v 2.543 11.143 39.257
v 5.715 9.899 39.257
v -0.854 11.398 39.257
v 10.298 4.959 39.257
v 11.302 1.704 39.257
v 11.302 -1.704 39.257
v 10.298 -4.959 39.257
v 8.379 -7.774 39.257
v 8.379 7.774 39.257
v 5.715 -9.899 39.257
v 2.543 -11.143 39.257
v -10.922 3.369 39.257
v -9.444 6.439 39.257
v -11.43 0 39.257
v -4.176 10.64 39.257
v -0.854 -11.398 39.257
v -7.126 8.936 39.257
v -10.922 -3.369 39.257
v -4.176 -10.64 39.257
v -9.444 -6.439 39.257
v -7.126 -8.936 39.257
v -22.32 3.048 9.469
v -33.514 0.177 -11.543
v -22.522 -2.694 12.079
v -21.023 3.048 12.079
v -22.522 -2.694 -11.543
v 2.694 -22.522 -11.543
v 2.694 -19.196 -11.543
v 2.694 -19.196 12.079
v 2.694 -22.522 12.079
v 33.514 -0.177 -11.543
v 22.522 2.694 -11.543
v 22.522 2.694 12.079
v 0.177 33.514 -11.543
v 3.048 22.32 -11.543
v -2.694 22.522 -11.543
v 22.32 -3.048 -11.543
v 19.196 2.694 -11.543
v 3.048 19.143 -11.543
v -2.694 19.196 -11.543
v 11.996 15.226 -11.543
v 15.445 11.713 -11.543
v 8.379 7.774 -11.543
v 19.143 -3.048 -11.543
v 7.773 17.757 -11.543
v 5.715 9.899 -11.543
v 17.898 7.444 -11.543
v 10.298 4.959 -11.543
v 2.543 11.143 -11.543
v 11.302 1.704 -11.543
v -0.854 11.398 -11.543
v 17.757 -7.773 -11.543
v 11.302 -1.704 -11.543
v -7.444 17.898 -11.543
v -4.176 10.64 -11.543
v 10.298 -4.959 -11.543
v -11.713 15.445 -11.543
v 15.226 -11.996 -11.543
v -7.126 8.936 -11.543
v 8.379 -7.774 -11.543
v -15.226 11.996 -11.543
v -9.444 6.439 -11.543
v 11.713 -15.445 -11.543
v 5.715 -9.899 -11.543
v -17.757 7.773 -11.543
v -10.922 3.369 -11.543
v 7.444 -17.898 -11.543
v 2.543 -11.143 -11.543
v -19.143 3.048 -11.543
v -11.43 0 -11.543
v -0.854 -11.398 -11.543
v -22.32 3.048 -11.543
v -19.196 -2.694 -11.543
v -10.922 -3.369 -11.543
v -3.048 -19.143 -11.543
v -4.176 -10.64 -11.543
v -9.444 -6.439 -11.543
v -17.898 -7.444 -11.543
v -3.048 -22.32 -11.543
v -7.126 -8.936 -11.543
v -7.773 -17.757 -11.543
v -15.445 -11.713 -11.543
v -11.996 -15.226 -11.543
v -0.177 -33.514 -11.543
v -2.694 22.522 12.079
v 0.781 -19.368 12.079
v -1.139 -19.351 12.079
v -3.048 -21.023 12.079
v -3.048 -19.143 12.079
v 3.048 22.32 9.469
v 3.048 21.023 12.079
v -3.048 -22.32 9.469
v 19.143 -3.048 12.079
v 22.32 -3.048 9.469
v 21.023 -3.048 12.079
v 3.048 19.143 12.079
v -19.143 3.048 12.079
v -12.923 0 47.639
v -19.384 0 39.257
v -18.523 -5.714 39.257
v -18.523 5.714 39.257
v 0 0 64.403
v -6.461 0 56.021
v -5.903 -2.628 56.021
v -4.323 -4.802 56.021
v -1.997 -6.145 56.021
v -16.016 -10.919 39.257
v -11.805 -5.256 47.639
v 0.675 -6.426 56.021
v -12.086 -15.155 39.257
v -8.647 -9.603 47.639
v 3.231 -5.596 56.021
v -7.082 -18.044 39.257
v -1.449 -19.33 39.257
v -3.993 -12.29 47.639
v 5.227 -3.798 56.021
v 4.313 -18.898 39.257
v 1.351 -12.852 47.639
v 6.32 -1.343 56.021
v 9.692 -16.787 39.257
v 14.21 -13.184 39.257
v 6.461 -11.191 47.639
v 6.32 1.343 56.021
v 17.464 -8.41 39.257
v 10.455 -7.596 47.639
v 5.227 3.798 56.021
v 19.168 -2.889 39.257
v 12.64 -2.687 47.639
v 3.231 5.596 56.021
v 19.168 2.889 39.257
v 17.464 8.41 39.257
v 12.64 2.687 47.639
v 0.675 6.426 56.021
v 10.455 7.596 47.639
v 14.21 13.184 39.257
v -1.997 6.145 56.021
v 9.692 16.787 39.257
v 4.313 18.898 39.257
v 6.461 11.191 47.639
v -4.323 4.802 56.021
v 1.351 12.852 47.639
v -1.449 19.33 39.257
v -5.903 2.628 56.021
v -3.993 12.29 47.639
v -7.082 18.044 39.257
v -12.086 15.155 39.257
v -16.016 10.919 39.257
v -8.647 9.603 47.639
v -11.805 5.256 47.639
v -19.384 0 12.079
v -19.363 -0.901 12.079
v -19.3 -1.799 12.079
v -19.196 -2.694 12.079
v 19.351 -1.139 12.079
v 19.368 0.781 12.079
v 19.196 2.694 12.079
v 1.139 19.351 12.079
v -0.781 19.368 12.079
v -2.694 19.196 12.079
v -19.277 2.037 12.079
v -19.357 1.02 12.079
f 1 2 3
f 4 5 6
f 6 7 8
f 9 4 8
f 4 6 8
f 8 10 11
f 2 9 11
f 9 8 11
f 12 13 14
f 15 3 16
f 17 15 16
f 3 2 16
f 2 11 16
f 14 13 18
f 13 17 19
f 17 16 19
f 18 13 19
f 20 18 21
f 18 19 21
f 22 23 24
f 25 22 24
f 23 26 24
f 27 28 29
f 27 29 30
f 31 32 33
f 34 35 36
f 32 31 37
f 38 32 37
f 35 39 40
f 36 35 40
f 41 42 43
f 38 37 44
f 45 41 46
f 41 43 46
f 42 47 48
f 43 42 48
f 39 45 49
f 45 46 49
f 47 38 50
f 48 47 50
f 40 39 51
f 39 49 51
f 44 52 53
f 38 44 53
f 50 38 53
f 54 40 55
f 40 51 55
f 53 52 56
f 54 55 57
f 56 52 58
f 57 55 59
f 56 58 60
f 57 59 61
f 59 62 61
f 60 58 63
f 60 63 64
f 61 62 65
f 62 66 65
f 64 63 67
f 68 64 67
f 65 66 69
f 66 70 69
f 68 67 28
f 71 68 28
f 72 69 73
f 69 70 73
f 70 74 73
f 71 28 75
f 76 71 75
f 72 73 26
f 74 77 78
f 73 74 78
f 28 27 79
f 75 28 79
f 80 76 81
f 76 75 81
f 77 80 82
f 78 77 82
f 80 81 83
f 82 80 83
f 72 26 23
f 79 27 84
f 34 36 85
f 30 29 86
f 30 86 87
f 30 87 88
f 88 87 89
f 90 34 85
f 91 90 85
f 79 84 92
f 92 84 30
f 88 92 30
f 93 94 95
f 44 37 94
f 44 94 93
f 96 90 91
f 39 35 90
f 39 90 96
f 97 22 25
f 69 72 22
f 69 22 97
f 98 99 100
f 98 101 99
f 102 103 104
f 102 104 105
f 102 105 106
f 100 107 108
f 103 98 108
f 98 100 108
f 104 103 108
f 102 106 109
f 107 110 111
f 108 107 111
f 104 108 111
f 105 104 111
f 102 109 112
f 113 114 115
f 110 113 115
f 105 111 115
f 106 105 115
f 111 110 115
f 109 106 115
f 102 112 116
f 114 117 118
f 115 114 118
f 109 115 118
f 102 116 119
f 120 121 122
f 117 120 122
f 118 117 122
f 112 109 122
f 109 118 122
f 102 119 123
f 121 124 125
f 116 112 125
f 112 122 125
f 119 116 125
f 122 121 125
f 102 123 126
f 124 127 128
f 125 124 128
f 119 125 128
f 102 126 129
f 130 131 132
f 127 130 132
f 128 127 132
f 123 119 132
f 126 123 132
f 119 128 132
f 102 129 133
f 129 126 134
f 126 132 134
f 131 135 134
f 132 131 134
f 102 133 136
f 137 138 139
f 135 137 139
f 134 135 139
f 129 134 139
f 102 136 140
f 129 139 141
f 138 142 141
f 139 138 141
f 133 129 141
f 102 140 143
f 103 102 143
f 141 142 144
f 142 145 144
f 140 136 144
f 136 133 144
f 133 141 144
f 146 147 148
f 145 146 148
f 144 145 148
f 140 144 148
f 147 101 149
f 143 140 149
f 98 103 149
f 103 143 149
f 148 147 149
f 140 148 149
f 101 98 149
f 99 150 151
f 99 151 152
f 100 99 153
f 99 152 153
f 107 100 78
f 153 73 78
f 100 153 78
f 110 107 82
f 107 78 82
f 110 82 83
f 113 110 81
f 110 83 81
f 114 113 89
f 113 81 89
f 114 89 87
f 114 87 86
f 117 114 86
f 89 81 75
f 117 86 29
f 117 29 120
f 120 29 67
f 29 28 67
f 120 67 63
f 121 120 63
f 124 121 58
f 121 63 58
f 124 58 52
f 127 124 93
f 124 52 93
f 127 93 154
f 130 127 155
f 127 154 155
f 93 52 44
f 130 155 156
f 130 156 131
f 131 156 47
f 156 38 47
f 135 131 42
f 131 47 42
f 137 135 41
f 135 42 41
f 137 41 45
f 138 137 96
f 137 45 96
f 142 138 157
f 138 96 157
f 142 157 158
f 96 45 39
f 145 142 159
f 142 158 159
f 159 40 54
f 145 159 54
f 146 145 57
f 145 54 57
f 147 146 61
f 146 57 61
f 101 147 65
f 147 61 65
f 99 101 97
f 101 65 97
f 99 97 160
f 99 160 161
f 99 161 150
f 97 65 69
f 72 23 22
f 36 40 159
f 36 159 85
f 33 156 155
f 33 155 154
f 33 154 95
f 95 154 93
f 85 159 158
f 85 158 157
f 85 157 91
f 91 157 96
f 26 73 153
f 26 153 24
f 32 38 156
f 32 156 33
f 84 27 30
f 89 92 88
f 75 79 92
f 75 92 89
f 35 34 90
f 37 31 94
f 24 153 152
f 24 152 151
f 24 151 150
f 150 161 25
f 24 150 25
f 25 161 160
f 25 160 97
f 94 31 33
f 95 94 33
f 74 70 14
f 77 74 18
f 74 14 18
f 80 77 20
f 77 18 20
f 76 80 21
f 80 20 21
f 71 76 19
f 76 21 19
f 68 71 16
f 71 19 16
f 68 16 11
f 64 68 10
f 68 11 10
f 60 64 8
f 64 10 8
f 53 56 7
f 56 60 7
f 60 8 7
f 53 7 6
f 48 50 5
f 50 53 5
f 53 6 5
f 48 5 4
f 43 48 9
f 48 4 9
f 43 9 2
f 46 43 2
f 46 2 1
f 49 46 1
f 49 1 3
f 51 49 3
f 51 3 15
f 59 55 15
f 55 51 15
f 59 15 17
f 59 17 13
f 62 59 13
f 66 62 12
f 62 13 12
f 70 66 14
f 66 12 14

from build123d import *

# Parameters (mm, degrees)
F3_DEPTH = 23.622
F5_DEPTH = 267.208
F7_COUNT = 4


with BuildPart() as f1:
    # F0 (on Front) → F1 (revolve)
    with BuildSketch(Plane.XZ):
        Polygon((-11.43, -11.5434539532), (-11.43, 13.8565460468), (-11.43, 39.2565460468), (0, 39.2565460468), (0, 64.4025460468), (-19.3840445728, 39.2565460468), (-19.3840445728, -11.5434539532), align=None)
    revolve(axis=Axis((0, 0, 51.8295460468), (0, 0, 1)))

    # F2 (on face) → F3 (join)
    with BuildSketch(Plane(origin=(0, 0, -11.5434539532), x_dir=(1, 0, 0), z_dir=(0, 0, -1))):
        with BuildLine():
            Line((-2.6940780226, -19.1959143468), (-2.6940780226, -22.5224811584))
            Line((-2.6940780226, -22.5224811584), (0.1769623486, -33.5143171251))
            Line((0.1769623486, -33.5143171251), (3.0480027199, -22.3197587766))
            Line((3.0480027199, -22.3197587766), (3.0480027199, -19.1429063473))
            ThreePointArc((3.0480027199, -19.1429063473), (0.1789361194, -19.3832186663), (-2.6940780226, -19.1959143468))
        make_face()
    extrude(amount=-F3_DEPTH)

    # F4 (on face) → F5 (cut)
    with BuildSketch(Plane(origin=(-8.0291148796, 2.0971849502, 0), x_dir=(-0.2527189829, -0.9675397231, 0), z_dir=(-0.9675397231, 0.2527189829, 0))):
        Polygon((-32.4711548542, -11.5434539532), (-21.1105505247, 12.0785460468), (-32.4711548542, 12.0785460468), align=None)
    extrude(amount=-F5_DEPTH, mode=Mode.SUBTRACT)

    # F7: F1 ×4 about axis
    f7_axis = Axis((0, 0, 24.6183145791), (0, 0, -1))


with BuildPart() as f1_1:
    add(f1.part)
    for i in range(1, F7_COUNT):
        add(f1.part.rotate(f7_axis, i * 360 / F7_COUNT))


solid = f1_1.part
